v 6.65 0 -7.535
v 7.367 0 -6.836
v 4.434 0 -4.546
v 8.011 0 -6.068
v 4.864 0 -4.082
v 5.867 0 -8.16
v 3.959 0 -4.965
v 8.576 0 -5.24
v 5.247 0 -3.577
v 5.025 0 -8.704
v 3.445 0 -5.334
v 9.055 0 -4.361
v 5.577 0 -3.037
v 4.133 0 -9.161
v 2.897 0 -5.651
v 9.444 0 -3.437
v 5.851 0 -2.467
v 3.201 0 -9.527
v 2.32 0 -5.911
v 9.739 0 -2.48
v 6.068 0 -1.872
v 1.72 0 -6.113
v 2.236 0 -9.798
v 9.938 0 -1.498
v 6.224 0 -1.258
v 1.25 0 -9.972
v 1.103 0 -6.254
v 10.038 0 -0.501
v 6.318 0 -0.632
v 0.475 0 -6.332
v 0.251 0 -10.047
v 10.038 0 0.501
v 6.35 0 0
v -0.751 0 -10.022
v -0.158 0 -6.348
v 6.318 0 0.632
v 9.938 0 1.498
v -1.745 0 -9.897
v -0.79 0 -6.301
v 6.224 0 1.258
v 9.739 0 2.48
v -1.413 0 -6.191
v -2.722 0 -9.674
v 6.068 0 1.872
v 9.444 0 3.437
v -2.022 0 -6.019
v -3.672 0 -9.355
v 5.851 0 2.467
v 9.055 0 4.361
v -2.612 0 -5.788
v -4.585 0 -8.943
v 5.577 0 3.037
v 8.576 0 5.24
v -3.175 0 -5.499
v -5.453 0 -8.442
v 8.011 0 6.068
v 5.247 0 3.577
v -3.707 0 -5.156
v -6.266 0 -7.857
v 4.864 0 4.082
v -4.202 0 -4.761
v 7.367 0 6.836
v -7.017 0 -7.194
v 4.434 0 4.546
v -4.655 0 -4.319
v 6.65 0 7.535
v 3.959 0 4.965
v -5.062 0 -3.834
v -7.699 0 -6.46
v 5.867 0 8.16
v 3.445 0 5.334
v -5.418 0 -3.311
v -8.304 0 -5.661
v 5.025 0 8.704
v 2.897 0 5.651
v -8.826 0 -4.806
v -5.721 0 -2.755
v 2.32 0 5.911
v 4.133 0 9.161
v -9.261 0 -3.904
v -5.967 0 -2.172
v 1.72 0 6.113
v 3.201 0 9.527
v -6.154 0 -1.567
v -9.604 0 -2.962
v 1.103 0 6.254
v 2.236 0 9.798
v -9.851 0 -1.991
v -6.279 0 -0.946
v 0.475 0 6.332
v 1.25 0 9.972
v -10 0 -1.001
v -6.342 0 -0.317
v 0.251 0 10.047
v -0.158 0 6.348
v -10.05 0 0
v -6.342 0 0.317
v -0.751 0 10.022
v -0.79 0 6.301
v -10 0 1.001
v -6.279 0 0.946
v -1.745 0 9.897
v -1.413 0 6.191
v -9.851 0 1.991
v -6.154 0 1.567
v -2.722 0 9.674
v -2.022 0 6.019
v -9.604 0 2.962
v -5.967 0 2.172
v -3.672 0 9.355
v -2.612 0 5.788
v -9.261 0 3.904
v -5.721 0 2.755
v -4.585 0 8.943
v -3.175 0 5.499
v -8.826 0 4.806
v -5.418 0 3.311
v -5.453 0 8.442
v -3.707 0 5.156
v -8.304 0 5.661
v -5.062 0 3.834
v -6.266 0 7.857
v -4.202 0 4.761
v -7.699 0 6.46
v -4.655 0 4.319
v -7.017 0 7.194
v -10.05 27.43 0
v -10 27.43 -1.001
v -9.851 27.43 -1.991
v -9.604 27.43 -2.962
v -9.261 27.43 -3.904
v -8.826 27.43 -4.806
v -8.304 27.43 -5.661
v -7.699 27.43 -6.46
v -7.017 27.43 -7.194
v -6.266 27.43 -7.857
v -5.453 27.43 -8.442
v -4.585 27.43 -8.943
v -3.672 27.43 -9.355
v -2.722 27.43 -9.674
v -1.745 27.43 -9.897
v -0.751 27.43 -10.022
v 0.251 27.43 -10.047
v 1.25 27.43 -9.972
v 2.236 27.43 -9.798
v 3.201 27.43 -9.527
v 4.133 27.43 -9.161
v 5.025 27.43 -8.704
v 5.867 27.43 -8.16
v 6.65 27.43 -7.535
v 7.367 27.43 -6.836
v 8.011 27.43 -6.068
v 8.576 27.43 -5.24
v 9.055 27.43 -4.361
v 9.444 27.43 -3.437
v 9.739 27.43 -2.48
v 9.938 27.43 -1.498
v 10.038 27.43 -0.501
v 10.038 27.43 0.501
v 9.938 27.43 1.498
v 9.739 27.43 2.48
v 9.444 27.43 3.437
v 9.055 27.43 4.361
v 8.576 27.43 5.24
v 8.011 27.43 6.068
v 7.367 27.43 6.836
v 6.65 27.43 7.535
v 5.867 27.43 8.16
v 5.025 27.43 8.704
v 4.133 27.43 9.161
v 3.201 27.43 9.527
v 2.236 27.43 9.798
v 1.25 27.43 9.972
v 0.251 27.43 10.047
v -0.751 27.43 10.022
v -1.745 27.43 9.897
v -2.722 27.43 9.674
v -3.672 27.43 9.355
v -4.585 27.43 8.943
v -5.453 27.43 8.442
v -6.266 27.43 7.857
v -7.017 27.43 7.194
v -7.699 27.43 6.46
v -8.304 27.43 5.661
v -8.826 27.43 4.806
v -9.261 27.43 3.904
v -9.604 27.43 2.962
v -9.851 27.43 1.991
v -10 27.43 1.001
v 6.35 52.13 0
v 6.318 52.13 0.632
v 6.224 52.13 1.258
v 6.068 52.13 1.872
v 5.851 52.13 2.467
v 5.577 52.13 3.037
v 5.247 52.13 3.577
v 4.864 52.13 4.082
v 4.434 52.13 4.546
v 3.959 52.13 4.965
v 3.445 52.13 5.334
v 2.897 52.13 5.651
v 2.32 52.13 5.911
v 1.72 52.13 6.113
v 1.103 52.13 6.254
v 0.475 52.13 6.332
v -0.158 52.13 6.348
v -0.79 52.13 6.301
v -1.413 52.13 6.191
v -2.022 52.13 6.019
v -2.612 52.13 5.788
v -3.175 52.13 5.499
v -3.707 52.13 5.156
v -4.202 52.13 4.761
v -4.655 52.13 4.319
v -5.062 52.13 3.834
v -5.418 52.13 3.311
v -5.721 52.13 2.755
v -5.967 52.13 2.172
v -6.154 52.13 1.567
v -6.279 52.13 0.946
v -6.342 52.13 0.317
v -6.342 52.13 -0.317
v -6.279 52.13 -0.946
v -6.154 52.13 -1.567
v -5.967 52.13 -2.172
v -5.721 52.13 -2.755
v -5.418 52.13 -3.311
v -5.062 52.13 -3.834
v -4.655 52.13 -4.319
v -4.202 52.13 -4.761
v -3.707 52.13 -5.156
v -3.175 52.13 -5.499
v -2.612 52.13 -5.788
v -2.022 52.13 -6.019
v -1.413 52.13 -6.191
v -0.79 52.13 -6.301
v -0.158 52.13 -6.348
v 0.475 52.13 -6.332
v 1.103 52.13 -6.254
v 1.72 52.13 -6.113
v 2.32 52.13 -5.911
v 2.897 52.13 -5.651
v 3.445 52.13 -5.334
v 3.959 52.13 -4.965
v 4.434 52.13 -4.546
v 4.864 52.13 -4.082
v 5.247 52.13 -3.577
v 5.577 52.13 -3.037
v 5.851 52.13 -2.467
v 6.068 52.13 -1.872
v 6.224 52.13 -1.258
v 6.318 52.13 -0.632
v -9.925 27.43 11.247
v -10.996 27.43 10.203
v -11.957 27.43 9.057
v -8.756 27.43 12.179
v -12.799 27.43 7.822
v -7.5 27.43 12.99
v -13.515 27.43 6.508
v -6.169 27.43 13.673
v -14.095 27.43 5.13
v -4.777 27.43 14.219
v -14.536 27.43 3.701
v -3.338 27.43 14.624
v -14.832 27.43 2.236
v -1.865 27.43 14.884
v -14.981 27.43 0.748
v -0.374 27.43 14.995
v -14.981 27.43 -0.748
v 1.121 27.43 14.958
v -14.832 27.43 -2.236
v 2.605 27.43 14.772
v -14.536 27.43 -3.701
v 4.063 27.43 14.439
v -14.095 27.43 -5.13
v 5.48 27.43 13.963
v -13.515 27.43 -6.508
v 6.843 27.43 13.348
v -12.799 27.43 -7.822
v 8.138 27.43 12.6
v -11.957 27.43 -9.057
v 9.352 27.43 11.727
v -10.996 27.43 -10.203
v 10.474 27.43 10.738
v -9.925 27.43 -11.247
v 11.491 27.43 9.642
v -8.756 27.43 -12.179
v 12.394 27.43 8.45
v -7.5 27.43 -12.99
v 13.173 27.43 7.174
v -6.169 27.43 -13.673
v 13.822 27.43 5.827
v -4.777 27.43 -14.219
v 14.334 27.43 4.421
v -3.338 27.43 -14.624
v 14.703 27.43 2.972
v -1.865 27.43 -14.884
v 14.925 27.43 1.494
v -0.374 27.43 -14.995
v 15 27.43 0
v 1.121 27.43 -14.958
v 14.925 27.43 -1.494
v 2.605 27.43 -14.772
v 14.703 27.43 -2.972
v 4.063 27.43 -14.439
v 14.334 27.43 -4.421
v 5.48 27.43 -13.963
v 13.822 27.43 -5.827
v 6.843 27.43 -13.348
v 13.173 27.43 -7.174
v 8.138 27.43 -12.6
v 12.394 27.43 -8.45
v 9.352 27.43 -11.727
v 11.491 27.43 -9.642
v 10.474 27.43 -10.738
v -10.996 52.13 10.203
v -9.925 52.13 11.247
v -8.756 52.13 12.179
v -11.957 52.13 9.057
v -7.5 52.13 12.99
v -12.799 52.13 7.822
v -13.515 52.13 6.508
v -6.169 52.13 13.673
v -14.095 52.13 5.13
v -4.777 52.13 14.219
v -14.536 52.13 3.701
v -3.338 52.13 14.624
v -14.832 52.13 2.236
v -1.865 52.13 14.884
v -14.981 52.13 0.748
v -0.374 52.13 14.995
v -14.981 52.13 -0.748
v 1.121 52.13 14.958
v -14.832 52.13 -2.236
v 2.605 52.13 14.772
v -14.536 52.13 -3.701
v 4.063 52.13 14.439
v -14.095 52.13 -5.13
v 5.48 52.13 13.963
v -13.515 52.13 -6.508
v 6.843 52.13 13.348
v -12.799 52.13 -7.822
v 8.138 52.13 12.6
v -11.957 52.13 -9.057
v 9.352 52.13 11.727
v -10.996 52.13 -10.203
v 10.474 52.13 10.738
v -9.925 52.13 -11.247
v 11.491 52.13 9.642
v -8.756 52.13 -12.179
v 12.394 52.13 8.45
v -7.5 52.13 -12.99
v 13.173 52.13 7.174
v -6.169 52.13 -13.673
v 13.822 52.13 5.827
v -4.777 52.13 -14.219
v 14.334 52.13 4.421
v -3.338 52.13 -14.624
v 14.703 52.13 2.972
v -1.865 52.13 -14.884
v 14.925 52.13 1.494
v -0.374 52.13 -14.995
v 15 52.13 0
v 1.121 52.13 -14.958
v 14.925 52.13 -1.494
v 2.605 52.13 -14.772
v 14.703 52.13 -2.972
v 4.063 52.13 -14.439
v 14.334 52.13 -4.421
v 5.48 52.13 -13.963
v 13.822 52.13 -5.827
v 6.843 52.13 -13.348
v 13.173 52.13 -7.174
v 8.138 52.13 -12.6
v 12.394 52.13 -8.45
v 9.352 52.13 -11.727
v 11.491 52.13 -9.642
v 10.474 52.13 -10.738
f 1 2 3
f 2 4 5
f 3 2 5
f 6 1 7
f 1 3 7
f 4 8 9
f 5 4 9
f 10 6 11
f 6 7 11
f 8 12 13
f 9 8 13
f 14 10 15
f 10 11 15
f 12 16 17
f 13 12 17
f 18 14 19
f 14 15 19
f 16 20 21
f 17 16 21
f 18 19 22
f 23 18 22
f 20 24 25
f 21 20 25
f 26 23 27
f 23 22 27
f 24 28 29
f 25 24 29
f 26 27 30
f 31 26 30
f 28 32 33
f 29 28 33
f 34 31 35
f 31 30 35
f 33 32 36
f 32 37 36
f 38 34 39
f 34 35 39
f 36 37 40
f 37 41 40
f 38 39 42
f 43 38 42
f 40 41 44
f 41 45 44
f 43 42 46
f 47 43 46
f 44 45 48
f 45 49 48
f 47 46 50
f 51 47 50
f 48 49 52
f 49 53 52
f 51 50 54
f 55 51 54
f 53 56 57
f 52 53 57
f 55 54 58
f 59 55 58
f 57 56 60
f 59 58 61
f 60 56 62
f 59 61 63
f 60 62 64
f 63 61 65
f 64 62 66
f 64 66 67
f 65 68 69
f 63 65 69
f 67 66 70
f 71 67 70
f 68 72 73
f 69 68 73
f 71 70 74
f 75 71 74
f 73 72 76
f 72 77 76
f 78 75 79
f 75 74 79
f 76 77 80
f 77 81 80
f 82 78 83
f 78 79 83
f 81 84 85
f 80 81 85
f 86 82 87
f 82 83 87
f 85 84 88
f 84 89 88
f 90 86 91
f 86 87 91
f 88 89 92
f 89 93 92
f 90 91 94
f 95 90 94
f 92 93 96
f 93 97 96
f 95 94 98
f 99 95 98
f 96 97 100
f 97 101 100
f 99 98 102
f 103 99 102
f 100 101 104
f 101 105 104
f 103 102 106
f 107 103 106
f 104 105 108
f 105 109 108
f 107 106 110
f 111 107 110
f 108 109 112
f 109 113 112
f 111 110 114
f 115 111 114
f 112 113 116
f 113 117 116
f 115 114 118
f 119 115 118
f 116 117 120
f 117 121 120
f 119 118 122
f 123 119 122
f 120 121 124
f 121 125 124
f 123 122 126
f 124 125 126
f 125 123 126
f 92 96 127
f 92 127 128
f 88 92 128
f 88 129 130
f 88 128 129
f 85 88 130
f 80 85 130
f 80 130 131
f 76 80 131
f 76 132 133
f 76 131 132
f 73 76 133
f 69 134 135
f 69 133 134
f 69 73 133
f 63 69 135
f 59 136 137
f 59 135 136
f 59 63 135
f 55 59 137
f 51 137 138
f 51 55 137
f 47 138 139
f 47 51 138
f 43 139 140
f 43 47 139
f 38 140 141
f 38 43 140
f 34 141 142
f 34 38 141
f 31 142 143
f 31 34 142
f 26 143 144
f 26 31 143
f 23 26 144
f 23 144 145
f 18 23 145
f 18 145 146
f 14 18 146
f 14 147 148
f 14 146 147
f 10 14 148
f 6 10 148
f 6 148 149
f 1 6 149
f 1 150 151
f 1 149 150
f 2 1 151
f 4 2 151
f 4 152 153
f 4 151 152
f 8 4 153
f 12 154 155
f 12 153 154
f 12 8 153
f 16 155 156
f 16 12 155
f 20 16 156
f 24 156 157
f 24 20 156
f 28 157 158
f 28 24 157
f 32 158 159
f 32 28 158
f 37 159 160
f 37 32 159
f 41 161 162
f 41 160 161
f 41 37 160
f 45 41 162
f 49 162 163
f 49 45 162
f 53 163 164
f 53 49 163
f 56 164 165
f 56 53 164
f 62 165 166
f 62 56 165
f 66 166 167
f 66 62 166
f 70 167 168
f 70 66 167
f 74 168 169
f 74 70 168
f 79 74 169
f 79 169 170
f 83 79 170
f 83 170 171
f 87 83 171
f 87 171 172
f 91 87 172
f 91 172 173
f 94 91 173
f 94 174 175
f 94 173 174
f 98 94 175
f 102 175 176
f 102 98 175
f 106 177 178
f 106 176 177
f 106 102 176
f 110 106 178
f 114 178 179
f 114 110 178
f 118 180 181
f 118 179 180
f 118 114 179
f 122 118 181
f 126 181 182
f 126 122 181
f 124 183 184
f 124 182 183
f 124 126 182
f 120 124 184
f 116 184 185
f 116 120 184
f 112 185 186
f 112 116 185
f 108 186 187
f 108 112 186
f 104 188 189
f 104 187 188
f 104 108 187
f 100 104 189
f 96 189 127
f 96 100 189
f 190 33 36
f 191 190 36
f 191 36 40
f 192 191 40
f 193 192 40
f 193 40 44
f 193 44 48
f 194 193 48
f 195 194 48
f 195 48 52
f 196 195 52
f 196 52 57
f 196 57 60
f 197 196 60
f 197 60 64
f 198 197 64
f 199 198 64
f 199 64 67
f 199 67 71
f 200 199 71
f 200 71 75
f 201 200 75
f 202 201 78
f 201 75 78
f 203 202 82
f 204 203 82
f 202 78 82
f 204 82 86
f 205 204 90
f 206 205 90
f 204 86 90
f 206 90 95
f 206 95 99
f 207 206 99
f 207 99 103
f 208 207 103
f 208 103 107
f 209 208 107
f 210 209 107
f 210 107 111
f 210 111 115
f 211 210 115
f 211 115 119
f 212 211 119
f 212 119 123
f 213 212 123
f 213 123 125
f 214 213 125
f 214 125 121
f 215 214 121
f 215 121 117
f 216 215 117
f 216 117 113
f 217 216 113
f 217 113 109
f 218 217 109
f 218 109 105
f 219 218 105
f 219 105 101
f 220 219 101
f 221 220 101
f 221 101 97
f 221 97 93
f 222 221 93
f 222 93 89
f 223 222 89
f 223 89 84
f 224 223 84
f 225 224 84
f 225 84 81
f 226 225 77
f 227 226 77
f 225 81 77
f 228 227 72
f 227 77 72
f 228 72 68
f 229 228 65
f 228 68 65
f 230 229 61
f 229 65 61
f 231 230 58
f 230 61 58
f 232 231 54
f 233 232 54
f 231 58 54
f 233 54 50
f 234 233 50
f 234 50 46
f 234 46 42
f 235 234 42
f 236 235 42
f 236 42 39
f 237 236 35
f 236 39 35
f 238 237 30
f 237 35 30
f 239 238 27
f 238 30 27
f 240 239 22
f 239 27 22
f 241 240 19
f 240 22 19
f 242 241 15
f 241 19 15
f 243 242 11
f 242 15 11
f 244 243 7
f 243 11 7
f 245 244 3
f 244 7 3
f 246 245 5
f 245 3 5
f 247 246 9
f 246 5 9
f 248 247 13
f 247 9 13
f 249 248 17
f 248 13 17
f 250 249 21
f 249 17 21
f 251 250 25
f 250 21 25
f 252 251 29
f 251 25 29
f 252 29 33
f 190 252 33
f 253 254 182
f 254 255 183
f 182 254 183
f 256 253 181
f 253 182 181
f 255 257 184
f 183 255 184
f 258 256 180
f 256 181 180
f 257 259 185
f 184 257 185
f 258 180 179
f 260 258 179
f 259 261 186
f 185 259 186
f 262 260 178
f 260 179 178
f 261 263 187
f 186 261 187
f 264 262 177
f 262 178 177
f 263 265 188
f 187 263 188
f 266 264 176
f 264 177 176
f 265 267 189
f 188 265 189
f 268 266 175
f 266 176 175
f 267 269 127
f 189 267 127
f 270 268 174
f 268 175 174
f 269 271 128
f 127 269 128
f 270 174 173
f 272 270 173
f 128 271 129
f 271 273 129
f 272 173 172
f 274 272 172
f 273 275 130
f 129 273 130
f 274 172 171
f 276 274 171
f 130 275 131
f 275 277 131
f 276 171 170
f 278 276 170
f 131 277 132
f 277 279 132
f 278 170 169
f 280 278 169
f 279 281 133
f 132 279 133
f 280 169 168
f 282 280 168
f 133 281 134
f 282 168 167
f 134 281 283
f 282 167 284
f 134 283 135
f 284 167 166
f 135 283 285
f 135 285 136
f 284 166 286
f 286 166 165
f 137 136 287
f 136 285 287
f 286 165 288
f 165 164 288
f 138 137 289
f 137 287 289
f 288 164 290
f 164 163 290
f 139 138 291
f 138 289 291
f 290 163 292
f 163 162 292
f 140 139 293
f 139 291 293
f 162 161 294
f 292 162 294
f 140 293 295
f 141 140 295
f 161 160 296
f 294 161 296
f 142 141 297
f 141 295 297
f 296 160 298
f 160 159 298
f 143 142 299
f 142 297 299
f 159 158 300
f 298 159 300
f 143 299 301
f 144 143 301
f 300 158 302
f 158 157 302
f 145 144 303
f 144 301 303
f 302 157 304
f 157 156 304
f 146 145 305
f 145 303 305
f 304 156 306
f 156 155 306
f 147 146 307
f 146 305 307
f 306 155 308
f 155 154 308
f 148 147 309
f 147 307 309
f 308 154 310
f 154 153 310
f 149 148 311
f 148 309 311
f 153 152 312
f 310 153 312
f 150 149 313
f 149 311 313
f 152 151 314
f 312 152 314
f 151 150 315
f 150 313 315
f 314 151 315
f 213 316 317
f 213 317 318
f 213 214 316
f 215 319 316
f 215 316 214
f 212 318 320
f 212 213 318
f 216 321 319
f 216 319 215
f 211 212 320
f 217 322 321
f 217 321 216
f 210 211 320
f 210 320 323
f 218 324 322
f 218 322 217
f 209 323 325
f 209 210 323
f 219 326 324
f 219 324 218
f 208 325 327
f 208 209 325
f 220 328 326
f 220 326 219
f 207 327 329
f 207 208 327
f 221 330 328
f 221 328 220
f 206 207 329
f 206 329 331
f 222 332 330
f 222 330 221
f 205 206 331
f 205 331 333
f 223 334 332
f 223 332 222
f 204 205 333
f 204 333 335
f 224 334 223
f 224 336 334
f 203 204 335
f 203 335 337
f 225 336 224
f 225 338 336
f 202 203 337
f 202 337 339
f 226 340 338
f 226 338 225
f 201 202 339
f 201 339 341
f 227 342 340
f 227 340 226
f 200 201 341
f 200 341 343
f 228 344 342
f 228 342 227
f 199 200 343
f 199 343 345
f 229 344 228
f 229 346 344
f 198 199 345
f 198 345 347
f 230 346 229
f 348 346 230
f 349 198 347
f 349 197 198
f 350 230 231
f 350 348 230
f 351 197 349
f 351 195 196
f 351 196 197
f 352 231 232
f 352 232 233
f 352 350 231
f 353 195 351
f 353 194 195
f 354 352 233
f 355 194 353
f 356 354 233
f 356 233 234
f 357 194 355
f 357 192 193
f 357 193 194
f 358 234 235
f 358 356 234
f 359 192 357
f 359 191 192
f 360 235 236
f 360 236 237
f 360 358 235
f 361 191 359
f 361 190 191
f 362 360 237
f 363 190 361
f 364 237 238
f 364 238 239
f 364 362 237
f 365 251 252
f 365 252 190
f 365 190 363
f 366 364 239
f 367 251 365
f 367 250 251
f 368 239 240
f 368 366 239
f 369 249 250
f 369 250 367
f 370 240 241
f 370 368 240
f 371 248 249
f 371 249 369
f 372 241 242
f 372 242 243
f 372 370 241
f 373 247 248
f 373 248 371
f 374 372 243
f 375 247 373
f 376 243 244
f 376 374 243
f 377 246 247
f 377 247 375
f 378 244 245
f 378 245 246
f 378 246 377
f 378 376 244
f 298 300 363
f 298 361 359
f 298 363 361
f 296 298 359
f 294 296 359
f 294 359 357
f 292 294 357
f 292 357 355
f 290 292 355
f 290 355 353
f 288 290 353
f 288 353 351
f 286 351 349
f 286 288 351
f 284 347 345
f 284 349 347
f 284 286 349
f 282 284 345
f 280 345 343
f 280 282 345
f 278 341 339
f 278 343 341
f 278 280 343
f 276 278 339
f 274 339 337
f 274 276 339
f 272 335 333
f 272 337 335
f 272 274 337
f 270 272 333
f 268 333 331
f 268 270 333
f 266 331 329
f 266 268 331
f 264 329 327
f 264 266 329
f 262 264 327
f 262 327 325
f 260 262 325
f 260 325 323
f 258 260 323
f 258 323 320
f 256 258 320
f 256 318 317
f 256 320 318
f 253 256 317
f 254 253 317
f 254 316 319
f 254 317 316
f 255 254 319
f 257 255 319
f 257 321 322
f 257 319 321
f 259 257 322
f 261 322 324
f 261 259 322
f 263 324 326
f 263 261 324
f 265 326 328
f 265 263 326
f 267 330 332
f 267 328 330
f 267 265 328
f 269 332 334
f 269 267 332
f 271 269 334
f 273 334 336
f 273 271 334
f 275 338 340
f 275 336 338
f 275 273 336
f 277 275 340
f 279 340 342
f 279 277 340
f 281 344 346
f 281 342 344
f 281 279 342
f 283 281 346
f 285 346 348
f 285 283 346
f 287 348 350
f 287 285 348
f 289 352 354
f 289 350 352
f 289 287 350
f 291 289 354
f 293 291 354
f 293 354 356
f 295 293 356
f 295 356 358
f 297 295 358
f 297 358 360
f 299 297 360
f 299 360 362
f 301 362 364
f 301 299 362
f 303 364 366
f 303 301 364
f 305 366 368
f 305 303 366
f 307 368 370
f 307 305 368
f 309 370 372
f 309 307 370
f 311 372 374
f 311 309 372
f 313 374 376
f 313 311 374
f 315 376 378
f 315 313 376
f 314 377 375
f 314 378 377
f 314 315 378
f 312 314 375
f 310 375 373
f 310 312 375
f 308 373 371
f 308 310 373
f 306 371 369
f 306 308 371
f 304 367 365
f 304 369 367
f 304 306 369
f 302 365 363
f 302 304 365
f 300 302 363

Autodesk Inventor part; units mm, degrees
ref_plane "YZ Plane" through (0, 0, 0) normal (1, 0, 0) x (0, 1, 0)
ref_plane "XZ Plane" through (0, 0, 0) normal (0, 1, 0) x (-1, 0, 0)
ref_plane "XY Plane" through (0, 0, 0) normal (0, 0, 1) x (1, 0, 0)
sketch "Sketch1" plane through (0, 0, 0) normal (0, 1, 0) x (-1, 0, 0)
  circle A0 centre (0, 0) radius 10.05
  dimension "d0" = 20.1
extrude "Extrusion1" add sketch "Sketch1" along normal blind 27.43
sketch "Sketch2" plane through (0, 27.43, 0) normal (0, 1, 0) x (1, 0, 0)
  circle A0 centre (0, 0) radius 15
  dimension "d3" = 30
extrude "Extrusion2" add sketch "Sketch2" along normal blind 24.7
thread "Thread1" size "M22x3" class "6g" standard "ANSI Metric M Profile" full length
sketch "Sketch3" plane through (0, 0, 0) normal (0, -1, 0) x (1, 0, 0)
  circle A0 centre (0, 0) radius 6.35
  dimension "d8" = 12.7
extrude "Extrusion3" cut sketch "Sketch3" against normal blind 53
properties part number "AdaptadorMacho"
